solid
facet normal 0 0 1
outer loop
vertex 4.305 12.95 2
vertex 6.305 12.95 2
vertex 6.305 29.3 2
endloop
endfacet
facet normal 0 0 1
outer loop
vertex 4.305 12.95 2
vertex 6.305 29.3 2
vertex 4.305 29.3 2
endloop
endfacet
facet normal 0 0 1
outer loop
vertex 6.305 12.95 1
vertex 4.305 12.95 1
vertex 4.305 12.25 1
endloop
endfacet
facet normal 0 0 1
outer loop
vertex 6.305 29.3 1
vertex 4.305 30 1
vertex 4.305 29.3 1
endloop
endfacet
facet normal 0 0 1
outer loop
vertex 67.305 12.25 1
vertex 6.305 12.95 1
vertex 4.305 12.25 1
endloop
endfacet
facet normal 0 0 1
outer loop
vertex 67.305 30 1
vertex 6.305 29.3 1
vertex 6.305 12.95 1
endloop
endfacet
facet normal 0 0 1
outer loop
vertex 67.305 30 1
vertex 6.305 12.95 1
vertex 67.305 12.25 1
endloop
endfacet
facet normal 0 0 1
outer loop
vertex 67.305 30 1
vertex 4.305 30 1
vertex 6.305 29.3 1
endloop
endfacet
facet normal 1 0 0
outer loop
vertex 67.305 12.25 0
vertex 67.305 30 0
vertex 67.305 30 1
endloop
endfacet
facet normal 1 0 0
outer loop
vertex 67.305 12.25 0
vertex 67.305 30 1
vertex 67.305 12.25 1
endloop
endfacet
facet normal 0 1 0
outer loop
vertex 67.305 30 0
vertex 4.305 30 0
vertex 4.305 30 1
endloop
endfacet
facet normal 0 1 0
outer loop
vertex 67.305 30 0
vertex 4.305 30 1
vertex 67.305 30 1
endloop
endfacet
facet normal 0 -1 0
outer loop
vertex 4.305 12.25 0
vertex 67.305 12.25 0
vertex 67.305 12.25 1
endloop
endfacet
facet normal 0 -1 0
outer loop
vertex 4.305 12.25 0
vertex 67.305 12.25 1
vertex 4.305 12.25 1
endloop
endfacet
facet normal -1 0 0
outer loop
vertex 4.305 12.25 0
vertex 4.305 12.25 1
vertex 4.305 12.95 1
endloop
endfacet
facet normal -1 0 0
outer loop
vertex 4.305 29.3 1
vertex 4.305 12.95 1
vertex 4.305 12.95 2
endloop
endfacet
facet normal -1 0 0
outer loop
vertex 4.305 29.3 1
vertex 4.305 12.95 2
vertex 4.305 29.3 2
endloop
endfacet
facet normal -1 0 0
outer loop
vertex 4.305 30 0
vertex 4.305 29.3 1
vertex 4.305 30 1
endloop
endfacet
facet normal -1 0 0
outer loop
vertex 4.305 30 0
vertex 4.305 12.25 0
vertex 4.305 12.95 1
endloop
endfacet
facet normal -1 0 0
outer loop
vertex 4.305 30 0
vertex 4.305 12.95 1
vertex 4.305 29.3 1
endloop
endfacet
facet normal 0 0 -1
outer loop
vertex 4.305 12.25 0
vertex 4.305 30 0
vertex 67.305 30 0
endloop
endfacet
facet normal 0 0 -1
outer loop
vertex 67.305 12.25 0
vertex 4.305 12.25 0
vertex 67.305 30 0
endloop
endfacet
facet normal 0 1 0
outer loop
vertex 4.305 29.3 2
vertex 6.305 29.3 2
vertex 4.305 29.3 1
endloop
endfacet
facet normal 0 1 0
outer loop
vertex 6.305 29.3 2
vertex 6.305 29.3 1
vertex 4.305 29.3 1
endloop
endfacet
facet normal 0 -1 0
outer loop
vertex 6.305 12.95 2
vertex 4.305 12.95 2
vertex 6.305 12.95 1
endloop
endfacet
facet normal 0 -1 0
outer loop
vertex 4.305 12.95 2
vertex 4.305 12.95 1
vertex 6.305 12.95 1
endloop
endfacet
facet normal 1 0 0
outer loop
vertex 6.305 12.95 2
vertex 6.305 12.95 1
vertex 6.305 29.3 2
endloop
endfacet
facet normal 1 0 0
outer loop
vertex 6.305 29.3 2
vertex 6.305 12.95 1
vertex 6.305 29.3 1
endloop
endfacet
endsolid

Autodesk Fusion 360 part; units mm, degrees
sketch "Esquisse1" plane through (0, 0, 0) normal (0, 0, 1) x (1, 0, 0)
  line L0 (4.3054, 30) -> (67.3054, 30)
  line L1 (67.3054, 30) -> (67.3054, 12.25)
  line L2 (67.3054, 12.25) -> (4.3054, 12.25)
  line L3 (4.3054, 12.25) -> (4.3054, 30)
  dimension "d1" = 63
  dimension "d2" = 17.75
extrude "Extrusion1" add sketch "Esquisse1" along normal blind 1
sketch "Esquisse2" plane through (0, 0, 1) normal (0, 0, 1) x (-1, 0, 0)
  line L0 (-4.3054, -12.25) -> (-67.3054, -12.25)
  line L1 (-67.3054, -12.25) -> (-67.3054, -30)
  line L2 (-67.3054, -30) -> (-4.3054, -30)
  line L3 (-4.3054, -30) -> (-4.3054, -12.25)
  line L4 (-4.3054, -12.95) -> (-6.3054, -12.95)
  line L5 (-6.3054, -12.95) -> (-6.3054, -29.3)
  line L6 (-6.3054, -29.3) -> (-4.3054, -29.3)
  line L7 (-4.3054, -29.3) -> (-4.3054, -12.95)
  line L8 (-67.3054, -21.125) -> (-4.3054, -21.125) construction
  dimension "d5" = 16.35
  dimension "d8" = 2
extrude "Extrusion2" add sketch "Esquisse2" along normal blind 1 contours L3 L4 L5 L6 L7
